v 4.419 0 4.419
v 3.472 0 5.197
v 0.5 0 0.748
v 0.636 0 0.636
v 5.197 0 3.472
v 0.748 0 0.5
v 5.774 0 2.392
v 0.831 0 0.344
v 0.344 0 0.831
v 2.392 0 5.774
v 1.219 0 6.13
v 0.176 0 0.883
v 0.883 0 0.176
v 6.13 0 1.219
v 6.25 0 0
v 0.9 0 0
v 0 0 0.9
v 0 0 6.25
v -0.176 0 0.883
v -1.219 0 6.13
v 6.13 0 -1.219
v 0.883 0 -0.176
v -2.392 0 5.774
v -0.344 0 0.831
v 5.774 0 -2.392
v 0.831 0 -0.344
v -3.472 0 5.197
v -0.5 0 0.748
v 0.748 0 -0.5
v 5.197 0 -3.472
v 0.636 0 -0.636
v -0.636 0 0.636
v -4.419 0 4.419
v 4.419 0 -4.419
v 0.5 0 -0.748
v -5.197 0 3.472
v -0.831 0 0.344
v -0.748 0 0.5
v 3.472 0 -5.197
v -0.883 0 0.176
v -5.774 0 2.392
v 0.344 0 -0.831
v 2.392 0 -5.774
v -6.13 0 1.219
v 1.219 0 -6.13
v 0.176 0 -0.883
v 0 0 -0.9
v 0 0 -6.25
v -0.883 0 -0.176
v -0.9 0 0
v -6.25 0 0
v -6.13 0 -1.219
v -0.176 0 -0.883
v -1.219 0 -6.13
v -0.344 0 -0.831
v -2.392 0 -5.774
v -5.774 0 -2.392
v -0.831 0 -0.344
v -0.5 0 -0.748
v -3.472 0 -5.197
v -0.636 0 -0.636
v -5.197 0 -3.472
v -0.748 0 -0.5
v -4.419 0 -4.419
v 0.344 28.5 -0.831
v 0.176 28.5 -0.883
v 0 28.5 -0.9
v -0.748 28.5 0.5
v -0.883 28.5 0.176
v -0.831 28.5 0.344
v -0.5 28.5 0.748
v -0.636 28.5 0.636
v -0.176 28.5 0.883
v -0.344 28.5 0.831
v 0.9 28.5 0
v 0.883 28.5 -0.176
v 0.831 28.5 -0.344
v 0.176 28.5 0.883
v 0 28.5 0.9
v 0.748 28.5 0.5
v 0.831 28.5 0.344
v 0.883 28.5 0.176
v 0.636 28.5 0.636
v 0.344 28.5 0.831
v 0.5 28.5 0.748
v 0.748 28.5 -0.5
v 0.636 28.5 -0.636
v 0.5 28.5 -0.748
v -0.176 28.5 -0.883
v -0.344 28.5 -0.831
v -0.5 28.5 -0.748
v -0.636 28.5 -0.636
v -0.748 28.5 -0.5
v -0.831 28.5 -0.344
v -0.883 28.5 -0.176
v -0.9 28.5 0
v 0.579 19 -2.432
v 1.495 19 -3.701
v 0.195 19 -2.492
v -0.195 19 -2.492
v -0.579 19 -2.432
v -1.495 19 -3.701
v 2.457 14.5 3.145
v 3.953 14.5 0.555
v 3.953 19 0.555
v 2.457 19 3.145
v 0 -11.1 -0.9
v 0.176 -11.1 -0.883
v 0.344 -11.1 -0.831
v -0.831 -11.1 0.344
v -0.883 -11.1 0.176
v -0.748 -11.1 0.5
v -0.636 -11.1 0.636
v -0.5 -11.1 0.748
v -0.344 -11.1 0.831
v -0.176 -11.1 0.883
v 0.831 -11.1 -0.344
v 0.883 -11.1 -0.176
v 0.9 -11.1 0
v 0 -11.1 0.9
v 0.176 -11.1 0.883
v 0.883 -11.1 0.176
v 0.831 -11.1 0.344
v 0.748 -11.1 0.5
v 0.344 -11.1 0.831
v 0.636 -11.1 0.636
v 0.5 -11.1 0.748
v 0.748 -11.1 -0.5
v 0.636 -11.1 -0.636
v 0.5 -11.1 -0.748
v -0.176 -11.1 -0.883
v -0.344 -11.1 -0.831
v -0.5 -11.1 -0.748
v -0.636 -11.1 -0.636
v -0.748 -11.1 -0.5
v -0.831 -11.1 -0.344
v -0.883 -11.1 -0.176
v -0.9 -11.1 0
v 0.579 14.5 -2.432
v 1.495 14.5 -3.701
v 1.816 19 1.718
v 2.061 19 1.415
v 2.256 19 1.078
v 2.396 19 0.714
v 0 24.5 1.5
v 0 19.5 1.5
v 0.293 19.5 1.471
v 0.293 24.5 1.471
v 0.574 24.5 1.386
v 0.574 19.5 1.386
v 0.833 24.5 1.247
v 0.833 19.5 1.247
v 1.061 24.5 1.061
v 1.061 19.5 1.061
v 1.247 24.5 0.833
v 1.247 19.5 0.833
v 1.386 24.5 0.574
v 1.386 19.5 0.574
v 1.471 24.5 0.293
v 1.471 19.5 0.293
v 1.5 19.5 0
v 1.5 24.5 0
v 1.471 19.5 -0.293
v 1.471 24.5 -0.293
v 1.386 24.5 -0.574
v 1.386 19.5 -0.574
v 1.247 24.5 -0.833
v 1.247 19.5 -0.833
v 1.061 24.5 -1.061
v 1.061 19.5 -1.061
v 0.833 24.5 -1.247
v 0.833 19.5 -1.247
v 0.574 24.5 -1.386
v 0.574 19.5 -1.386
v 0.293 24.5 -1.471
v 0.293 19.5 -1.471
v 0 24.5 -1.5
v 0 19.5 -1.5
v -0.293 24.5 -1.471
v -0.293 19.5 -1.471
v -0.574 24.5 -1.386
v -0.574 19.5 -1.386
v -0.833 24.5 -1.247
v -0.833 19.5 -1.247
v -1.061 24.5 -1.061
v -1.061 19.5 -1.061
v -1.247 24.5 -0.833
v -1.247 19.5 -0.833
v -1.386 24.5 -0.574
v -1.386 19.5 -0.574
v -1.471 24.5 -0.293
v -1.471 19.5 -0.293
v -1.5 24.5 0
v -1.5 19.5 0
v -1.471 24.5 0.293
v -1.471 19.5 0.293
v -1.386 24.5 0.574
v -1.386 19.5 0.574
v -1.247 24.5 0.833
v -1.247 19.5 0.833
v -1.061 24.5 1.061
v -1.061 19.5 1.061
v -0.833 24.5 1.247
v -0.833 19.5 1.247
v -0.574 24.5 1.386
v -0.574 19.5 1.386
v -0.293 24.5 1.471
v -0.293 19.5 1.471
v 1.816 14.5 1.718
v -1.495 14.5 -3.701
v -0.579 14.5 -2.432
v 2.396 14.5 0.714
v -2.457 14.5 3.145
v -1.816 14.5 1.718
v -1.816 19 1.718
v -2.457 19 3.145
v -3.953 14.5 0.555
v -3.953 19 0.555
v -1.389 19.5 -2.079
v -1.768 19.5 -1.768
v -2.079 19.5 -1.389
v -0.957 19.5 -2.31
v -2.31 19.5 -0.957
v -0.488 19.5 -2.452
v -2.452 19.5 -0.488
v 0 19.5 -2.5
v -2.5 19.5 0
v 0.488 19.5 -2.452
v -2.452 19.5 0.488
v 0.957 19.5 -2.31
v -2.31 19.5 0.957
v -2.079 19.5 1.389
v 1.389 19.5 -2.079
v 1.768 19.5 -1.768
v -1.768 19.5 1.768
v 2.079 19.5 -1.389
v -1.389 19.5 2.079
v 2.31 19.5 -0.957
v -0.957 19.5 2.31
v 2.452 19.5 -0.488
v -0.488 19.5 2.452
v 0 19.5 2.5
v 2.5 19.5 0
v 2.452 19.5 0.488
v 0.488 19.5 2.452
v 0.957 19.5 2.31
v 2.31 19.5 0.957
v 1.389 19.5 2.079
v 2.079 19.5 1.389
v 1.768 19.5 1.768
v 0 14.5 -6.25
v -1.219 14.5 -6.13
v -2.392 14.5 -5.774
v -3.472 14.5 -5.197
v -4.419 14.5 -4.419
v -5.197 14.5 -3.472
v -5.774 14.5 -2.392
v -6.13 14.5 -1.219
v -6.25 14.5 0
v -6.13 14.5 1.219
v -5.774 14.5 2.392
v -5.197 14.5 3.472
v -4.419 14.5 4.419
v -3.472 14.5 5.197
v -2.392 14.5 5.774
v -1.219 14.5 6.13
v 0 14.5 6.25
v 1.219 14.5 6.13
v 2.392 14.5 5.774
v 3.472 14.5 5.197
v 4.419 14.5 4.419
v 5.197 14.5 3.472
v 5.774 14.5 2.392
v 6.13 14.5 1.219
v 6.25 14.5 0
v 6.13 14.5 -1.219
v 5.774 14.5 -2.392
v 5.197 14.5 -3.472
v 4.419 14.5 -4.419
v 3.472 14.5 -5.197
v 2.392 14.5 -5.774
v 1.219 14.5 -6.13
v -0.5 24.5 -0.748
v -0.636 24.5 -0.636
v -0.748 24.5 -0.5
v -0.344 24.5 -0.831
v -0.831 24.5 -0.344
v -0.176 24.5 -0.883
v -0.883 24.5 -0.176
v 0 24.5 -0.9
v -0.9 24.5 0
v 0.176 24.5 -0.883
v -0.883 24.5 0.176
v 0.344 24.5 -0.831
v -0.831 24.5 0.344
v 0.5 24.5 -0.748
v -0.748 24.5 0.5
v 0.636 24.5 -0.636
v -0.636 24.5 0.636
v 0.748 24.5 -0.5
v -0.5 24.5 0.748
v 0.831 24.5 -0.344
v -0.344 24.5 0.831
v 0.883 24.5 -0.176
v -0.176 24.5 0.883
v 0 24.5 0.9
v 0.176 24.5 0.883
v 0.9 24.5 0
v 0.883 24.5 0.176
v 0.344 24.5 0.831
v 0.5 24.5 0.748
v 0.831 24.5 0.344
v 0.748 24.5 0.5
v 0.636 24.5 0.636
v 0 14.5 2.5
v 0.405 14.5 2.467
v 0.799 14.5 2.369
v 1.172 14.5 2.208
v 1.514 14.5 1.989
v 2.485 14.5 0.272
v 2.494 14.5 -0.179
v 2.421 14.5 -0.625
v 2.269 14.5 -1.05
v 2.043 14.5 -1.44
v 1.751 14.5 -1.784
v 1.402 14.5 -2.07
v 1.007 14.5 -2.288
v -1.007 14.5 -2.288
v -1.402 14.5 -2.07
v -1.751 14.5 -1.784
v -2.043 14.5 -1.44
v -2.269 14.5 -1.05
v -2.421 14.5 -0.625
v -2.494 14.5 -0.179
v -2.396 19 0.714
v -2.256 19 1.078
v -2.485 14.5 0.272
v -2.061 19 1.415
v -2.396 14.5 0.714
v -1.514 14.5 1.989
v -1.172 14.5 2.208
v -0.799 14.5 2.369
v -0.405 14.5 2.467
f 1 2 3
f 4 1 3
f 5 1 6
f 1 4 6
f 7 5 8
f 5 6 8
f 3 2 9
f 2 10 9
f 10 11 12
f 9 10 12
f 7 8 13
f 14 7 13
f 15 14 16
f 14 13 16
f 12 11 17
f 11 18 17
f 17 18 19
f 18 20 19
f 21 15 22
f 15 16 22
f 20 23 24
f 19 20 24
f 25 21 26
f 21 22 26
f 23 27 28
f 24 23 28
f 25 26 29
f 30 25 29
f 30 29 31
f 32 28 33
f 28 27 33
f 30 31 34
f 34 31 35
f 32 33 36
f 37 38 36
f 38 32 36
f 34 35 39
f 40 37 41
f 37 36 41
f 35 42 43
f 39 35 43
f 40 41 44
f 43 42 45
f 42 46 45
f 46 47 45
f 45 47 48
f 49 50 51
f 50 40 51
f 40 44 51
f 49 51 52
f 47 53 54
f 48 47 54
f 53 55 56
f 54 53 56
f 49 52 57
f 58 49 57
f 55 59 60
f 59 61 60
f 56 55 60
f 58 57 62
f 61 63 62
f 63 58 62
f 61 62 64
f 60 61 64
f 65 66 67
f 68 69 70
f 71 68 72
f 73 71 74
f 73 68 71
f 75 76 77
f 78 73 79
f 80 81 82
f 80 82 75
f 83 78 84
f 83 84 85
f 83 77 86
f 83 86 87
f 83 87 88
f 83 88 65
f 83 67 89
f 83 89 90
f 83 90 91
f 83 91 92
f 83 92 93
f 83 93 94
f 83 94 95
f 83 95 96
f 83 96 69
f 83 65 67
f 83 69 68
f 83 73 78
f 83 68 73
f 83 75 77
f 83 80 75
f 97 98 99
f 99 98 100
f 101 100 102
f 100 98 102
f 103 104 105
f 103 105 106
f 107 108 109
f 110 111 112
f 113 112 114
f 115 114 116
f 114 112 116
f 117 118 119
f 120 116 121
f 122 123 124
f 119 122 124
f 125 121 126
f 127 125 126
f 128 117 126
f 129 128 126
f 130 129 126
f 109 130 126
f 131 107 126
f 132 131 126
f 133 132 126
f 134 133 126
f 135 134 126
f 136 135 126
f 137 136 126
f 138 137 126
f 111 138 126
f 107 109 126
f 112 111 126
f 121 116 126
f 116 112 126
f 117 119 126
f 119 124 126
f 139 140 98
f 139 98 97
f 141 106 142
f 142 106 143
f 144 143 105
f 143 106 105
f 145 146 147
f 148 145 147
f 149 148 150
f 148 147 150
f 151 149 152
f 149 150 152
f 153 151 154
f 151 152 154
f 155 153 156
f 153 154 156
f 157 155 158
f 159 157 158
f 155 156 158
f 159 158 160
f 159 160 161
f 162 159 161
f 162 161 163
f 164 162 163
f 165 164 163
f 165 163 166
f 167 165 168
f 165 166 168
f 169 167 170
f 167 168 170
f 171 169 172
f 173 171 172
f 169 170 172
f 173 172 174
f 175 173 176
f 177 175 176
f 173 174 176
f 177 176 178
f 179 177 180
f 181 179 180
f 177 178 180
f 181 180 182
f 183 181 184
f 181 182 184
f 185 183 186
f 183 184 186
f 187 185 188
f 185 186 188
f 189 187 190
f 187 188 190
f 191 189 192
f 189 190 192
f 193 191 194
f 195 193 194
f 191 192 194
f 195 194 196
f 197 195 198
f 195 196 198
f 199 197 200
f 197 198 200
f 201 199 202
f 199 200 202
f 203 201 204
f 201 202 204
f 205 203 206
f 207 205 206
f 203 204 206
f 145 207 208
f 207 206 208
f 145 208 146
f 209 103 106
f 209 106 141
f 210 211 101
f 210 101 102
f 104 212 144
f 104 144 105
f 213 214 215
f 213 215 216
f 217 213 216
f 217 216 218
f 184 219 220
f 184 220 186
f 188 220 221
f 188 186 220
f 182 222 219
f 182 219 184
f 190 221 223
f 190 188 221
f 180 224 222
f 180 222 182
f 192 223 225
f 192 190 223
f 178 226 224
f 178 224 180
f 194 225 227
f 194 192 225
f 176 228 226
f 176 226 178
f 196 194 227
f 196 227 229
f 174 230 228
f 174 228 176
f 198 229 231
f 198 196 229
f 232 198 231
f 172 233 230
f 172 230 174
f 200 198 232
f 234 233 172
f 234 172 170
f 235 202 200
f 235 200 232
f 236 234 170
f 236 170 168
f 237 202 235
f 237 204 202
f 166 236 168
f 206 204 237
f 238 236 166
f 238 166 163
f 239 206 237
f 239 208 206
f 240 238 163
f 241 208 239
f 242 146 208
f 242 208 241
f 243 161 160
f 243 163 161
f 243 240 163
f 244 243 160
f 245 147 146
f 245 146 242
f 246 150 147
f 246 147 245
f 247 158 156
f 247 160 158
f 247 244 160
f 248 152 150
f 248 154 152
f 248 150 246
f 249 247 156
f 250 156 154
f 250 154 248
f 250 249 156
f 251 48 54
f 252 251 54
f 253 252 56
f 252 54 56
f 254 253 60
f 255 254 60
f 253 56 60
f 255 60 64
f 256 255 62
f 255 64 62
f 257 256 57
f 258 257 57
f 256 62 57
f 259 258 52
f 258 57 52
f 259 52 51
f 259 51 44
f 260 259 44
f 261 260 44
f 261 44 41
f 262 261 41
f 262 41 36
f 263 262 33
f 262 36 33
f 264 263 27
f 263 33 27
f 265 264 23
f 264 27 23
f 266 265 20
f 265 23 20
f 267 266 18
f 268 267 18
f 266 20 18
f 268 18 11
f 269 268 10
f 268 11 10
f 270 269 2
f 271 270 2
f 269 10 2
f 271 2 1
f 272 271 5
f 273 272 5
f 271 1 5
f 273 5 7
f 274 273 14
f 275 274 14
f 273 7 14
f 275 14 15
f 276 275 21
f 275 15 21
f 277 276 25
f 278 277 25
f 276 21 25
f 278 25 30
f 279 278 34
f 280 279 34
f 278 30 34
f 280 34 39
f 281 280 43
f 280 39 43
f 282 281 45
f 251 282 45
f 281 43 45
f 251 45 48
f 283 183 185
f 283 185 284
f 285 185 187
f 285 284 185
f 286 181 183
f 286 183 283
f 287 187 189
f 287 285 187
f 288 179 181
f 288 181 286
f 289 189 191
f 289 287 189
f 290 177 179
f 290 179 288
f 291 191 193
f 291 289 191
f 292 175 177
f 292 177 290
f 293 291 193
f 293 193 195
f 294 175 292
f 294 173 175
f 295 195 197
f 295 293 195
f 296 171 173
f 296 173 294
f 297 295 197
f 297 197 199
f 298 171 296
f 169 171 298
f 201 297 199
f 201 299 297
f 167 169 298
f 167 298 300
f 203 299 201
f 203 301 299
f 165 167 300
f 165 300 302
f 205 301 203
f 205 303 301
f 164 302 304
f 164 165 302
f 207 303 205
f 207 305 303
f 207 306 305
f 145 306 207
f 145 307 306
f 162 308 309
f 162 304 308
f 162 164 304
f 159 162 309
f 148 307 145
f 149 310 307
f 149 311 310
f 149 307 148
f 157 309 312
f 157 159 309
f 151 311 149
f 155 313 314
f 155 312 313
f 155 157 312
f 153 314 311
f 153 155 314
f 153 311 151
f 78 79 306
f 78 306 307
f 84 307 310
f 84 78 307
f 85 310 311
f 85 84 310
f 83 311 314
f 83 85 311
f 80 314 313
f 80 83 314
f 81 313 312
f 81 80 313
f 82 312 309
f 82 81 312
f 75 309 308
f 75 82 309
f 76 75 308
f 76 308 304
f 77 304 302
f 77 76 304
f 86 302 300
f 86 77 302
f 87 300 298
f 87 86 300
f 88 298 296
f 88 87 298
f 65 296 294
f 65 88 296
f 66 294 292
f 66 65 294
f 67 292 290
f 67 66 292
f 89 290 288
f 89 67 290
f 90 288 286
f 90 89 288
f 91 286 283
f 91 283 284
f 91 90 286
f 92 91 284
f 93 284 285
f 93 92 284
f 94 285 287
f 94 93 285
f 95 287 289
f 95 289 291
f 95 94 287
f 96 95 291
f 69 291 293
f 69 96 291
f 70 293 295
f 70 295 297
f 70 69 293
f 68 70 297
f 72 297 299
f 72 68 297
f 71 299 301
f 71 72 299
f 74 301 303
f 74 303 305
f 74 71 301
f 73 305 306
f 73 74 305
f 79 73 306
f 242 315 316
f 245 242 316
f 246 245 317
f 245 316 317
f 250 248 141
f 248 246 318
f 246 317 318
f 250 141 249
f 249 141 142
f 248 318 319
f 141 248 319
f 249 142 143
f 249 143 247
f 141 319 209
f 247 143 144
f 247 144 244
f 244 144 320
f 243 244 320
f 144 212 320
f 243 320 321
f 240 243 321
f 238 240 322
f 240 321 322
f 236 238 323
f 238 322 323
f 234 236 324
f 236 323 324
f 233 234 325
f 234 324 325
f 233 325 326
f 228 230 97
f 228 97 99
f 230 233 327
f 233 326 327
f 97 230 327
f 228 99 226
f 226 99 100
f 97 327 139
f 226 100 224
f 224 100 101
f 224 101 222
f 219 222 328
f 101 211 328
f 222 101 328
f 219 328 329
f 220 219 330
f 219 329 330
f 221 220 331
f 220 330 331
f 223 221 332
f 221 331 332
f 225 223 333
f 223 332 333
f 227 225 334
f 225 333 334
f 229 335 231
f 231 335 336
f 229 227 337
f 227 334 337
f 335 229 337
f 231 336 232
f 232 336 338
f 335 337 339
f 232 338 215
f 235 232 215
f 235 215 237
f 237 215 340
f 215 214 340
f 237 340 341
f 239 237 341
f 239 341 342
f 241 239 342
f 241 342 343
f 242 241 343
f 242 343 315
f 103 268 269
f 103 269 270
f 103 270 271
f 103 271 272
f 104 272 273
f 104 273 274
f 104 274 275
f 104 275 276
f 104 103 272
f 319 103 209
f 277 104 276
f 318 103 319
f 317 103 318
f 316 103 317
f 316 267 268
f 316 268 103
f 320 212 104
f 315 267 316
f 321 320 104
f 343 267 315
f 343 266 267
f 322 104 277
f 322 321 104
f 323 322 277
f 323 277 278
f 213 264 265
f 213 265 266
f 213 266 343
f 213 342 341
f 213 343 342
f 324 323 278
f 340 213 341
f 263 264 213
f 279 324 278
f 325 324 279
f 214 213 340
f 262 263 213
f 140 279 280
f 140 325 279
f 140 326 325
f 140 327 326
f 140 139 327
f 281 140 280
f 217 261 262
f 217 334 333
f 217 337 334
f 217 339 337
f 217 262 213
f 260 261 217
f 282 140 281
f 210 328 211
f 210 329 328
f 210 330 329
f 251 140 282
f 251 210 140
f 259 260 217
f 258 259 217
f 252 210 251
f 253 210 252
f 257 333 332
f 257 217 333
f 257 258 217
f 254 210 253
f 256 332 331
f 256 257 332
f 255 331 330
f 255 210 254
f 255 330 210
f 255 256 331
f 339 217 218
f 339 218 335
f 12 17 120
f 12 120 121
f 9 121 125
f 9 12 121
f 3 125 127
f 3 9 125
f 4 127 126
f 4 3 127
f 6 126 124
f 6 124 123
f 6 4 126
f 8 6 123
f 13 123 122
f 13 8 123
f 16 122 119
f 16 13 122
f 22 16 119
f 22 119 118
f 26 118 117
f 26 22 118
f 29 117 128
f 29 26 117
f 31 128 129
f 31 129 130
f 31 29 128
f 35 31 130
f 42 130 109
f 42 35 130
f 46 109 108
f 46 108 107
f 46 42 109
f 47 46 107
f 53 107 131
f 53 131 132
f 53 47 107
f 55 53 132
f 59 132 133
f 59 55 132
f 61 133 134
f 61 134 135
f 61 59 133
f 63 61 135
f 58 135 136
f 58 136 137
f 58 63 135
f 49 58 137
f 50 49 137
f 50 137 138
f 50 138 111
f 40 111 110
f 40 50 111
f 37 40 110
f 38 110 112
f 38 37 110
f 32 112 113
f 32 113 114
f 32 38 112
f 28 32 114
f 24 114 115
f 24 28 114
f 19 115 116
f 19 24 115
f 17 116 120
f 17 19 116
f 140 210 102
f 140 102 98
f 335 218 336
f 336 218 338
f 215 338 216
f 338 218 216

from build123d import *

# Parameters (mm, degrees)
SKETCH1_R           = 6.25
BOSS_EXTRUDE1_DEPTH = 14.5
SKETCH2_R           = 0.9
BOSS_EXTRUDE2_DEPTH = 11.1
SKETCH3_R           = 2.5
BOSS_EXTRUDE3_DEPTH = 5
SKETCH4_R           = 1.5
BOSS_EXTRUDE4_DEPTH = 5
BOSS_EXTRUDE5_START = 4
SKETCH5_R           = 0.9
BOSS_EXTRUDE5_DEPTH = 4
BOSS_EXTRUDE9_DEPTH = 4.5
CIRPATTERN1_COUNT   = 3


with BuildPart() as part:
    # Sketch1 → Boss-Extrude1 (new body)
    with BuildSketch(Plane(origin=(0, 0, 0), x_dir=(1, 0, 0), z_dir=(0, 1, 0))):
        with Locations(Location((0, 0, 0), (0, 0, 90))):
            Circle(SKETCH1_R)
    extrude(amount=BOSS_EXTRUDE1_DEPTH)

    # Sketch2 → Boss-Extrude2 (add)
    with BuildSketch(Plane(origin=(0, 0, 0), x_dir=(1, 0, 0), z_dir=(0, 1, 0))):
        with Locations(Location((0, 0, 0), (0, 0, 270))):
            Circle(SKETCH2_R)
    extrude(amount=-BOSS_EXTRUDE2_DEPTH)

    # Sketch3 → Boss-Extrude3 (add)
    with BuildSketch(Plane(origin=(0, 14.5, 0), x_dir=(1, 0, 0), z_dir=(0, 1, 0))):
        with Locations(Location((0, 0, 0), (0, 0, 270))):
            Circle(SKETCH3_R)
    extrude(amount=BOSS_EXTRUDE3_DEPTH)

    # Sketch4 → Boss-Extrude4 (add)
    with BuildSketch(Plane(origin=(0, 19.5, 0), x_dir=(1, 0, 0), z_dir=(0, 1, 0))):
        with Locations(Location((0, 0, 0), (0, 0, 270))):
            Circle(SKETCH4_R)
    extrude(amount=BOSS_EXTRUDE4_DEPTH)

    # Sketch5 → Boss-Extrude5 (add)
    with BuildSketch(Plane(origin=(0, 24.5, 0), x_dir=(1, 0, 0), z_dir=(0, 1, 0)).offset(BOSS_EXTRUDE5_START)):
        with Locations(Location((0, 0, 0), (0, 0, 270))):
            Circle(SKETCH5_R)
    extrude(amount=-BOSS_EXTRUDE5_DEPTH)

    # Sketch7 → Boss-Extrude9 (add)
    with BuildSketch(Plane(origin=(0, 14.5, 0), x_dir=(1, 0, 0), z_dir=(0, 1, 0))):
        with BuildLine():
            Line((-0.579481228, 2.431913137), (-1.495304536, 3.700729228))
            Line((-1.495304536, 3.700729228), (1.495304536, 3.700729228))
            Line((1.495304536, 3.700729228), (0.579481228, 2.431913137))
            ThreePointArc((0.579481228, 2.431913137), (0, 2.5), (-0.579481228, 2.431913137))
        make_face()
    boss_extrude9 = extrude(amount=BOSS_EXTRUDE9_DEPTH)

    # CirPattern1: Boss-Extrude9 ×3 about axis
    cirpattern1_axis = Axis((0, 0, 0), (0, 1, 0))
    for i in range(1, CIRPATTERN1_COUNT):
        add(boss_extrude9.rotate(cirpattern1_axis, i * 360 / CIRPATTERN1_COUNT))


solid = part.part
